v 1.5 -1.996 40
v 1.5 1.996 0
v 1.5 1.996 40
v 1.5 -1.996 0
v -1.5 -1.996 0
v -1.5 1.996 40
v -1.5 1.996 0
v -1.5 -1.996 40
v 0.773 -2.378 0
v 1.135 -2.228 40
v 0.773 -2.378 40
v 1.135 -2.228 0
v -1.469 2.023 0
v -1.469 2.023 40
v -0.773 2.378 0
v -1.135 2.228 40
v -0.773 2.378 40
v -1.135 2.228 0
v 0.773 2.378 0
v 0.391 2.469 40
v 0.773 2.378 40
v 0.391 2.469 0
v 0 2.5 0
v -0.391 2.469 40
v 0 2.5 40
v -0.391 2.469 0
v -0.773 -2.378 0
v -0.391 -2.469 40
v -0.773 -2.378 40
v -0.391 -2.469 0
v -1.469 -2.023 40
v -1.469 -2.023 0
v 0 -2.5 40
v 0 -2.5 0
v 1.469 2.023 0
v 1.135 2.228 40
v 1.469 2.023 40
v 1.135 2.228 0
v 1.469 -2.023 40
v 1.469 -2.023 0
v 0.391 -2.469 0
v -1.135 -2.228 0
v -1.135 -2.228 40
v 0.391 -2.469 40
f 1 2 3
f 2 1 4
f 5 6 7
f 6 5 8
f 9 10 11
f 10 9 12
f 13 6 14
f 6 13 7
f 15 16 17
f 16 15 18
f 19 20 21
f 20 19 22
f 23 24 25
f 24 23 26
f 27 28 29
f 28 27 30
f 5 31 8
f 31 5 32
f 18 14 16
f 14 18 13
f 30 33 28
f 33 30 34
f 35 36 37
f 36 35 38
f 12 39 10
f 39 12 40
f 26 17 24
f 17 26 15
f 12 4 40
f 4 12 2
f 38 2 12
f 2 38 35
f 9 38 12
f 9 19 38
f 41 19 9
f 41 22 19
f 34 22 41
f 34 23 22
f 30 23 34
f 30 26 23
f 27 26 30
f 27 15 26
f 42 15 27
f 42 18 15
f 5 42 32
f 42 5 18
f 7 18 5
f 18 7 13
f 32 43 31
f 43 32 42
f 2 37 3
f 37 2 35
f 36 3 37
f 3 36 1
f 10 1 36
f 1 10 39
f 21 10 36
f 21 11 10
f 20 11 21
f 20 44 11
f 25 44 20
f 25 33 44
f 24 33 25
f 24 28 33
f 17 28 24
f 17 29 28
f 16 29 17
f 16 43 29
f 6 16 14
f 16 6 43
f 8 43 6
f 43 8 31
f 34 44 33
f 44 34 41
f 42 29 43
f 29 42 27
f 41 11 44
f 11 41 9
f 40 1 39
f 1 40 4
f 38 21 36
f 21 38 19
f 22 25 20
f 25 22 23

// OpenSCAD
difference(){
	union(){
     cylinder(h=40, r=2.5, $fn=40, center=false);     
	}    
    {
        union() {
         translate([1.5,-10,-50]){
            cube([3,20,100], center=false);
         }
         translate([-4.5,-10,-50]){
            cube([3,20,100], center=false);
         }
        }
    }
}
